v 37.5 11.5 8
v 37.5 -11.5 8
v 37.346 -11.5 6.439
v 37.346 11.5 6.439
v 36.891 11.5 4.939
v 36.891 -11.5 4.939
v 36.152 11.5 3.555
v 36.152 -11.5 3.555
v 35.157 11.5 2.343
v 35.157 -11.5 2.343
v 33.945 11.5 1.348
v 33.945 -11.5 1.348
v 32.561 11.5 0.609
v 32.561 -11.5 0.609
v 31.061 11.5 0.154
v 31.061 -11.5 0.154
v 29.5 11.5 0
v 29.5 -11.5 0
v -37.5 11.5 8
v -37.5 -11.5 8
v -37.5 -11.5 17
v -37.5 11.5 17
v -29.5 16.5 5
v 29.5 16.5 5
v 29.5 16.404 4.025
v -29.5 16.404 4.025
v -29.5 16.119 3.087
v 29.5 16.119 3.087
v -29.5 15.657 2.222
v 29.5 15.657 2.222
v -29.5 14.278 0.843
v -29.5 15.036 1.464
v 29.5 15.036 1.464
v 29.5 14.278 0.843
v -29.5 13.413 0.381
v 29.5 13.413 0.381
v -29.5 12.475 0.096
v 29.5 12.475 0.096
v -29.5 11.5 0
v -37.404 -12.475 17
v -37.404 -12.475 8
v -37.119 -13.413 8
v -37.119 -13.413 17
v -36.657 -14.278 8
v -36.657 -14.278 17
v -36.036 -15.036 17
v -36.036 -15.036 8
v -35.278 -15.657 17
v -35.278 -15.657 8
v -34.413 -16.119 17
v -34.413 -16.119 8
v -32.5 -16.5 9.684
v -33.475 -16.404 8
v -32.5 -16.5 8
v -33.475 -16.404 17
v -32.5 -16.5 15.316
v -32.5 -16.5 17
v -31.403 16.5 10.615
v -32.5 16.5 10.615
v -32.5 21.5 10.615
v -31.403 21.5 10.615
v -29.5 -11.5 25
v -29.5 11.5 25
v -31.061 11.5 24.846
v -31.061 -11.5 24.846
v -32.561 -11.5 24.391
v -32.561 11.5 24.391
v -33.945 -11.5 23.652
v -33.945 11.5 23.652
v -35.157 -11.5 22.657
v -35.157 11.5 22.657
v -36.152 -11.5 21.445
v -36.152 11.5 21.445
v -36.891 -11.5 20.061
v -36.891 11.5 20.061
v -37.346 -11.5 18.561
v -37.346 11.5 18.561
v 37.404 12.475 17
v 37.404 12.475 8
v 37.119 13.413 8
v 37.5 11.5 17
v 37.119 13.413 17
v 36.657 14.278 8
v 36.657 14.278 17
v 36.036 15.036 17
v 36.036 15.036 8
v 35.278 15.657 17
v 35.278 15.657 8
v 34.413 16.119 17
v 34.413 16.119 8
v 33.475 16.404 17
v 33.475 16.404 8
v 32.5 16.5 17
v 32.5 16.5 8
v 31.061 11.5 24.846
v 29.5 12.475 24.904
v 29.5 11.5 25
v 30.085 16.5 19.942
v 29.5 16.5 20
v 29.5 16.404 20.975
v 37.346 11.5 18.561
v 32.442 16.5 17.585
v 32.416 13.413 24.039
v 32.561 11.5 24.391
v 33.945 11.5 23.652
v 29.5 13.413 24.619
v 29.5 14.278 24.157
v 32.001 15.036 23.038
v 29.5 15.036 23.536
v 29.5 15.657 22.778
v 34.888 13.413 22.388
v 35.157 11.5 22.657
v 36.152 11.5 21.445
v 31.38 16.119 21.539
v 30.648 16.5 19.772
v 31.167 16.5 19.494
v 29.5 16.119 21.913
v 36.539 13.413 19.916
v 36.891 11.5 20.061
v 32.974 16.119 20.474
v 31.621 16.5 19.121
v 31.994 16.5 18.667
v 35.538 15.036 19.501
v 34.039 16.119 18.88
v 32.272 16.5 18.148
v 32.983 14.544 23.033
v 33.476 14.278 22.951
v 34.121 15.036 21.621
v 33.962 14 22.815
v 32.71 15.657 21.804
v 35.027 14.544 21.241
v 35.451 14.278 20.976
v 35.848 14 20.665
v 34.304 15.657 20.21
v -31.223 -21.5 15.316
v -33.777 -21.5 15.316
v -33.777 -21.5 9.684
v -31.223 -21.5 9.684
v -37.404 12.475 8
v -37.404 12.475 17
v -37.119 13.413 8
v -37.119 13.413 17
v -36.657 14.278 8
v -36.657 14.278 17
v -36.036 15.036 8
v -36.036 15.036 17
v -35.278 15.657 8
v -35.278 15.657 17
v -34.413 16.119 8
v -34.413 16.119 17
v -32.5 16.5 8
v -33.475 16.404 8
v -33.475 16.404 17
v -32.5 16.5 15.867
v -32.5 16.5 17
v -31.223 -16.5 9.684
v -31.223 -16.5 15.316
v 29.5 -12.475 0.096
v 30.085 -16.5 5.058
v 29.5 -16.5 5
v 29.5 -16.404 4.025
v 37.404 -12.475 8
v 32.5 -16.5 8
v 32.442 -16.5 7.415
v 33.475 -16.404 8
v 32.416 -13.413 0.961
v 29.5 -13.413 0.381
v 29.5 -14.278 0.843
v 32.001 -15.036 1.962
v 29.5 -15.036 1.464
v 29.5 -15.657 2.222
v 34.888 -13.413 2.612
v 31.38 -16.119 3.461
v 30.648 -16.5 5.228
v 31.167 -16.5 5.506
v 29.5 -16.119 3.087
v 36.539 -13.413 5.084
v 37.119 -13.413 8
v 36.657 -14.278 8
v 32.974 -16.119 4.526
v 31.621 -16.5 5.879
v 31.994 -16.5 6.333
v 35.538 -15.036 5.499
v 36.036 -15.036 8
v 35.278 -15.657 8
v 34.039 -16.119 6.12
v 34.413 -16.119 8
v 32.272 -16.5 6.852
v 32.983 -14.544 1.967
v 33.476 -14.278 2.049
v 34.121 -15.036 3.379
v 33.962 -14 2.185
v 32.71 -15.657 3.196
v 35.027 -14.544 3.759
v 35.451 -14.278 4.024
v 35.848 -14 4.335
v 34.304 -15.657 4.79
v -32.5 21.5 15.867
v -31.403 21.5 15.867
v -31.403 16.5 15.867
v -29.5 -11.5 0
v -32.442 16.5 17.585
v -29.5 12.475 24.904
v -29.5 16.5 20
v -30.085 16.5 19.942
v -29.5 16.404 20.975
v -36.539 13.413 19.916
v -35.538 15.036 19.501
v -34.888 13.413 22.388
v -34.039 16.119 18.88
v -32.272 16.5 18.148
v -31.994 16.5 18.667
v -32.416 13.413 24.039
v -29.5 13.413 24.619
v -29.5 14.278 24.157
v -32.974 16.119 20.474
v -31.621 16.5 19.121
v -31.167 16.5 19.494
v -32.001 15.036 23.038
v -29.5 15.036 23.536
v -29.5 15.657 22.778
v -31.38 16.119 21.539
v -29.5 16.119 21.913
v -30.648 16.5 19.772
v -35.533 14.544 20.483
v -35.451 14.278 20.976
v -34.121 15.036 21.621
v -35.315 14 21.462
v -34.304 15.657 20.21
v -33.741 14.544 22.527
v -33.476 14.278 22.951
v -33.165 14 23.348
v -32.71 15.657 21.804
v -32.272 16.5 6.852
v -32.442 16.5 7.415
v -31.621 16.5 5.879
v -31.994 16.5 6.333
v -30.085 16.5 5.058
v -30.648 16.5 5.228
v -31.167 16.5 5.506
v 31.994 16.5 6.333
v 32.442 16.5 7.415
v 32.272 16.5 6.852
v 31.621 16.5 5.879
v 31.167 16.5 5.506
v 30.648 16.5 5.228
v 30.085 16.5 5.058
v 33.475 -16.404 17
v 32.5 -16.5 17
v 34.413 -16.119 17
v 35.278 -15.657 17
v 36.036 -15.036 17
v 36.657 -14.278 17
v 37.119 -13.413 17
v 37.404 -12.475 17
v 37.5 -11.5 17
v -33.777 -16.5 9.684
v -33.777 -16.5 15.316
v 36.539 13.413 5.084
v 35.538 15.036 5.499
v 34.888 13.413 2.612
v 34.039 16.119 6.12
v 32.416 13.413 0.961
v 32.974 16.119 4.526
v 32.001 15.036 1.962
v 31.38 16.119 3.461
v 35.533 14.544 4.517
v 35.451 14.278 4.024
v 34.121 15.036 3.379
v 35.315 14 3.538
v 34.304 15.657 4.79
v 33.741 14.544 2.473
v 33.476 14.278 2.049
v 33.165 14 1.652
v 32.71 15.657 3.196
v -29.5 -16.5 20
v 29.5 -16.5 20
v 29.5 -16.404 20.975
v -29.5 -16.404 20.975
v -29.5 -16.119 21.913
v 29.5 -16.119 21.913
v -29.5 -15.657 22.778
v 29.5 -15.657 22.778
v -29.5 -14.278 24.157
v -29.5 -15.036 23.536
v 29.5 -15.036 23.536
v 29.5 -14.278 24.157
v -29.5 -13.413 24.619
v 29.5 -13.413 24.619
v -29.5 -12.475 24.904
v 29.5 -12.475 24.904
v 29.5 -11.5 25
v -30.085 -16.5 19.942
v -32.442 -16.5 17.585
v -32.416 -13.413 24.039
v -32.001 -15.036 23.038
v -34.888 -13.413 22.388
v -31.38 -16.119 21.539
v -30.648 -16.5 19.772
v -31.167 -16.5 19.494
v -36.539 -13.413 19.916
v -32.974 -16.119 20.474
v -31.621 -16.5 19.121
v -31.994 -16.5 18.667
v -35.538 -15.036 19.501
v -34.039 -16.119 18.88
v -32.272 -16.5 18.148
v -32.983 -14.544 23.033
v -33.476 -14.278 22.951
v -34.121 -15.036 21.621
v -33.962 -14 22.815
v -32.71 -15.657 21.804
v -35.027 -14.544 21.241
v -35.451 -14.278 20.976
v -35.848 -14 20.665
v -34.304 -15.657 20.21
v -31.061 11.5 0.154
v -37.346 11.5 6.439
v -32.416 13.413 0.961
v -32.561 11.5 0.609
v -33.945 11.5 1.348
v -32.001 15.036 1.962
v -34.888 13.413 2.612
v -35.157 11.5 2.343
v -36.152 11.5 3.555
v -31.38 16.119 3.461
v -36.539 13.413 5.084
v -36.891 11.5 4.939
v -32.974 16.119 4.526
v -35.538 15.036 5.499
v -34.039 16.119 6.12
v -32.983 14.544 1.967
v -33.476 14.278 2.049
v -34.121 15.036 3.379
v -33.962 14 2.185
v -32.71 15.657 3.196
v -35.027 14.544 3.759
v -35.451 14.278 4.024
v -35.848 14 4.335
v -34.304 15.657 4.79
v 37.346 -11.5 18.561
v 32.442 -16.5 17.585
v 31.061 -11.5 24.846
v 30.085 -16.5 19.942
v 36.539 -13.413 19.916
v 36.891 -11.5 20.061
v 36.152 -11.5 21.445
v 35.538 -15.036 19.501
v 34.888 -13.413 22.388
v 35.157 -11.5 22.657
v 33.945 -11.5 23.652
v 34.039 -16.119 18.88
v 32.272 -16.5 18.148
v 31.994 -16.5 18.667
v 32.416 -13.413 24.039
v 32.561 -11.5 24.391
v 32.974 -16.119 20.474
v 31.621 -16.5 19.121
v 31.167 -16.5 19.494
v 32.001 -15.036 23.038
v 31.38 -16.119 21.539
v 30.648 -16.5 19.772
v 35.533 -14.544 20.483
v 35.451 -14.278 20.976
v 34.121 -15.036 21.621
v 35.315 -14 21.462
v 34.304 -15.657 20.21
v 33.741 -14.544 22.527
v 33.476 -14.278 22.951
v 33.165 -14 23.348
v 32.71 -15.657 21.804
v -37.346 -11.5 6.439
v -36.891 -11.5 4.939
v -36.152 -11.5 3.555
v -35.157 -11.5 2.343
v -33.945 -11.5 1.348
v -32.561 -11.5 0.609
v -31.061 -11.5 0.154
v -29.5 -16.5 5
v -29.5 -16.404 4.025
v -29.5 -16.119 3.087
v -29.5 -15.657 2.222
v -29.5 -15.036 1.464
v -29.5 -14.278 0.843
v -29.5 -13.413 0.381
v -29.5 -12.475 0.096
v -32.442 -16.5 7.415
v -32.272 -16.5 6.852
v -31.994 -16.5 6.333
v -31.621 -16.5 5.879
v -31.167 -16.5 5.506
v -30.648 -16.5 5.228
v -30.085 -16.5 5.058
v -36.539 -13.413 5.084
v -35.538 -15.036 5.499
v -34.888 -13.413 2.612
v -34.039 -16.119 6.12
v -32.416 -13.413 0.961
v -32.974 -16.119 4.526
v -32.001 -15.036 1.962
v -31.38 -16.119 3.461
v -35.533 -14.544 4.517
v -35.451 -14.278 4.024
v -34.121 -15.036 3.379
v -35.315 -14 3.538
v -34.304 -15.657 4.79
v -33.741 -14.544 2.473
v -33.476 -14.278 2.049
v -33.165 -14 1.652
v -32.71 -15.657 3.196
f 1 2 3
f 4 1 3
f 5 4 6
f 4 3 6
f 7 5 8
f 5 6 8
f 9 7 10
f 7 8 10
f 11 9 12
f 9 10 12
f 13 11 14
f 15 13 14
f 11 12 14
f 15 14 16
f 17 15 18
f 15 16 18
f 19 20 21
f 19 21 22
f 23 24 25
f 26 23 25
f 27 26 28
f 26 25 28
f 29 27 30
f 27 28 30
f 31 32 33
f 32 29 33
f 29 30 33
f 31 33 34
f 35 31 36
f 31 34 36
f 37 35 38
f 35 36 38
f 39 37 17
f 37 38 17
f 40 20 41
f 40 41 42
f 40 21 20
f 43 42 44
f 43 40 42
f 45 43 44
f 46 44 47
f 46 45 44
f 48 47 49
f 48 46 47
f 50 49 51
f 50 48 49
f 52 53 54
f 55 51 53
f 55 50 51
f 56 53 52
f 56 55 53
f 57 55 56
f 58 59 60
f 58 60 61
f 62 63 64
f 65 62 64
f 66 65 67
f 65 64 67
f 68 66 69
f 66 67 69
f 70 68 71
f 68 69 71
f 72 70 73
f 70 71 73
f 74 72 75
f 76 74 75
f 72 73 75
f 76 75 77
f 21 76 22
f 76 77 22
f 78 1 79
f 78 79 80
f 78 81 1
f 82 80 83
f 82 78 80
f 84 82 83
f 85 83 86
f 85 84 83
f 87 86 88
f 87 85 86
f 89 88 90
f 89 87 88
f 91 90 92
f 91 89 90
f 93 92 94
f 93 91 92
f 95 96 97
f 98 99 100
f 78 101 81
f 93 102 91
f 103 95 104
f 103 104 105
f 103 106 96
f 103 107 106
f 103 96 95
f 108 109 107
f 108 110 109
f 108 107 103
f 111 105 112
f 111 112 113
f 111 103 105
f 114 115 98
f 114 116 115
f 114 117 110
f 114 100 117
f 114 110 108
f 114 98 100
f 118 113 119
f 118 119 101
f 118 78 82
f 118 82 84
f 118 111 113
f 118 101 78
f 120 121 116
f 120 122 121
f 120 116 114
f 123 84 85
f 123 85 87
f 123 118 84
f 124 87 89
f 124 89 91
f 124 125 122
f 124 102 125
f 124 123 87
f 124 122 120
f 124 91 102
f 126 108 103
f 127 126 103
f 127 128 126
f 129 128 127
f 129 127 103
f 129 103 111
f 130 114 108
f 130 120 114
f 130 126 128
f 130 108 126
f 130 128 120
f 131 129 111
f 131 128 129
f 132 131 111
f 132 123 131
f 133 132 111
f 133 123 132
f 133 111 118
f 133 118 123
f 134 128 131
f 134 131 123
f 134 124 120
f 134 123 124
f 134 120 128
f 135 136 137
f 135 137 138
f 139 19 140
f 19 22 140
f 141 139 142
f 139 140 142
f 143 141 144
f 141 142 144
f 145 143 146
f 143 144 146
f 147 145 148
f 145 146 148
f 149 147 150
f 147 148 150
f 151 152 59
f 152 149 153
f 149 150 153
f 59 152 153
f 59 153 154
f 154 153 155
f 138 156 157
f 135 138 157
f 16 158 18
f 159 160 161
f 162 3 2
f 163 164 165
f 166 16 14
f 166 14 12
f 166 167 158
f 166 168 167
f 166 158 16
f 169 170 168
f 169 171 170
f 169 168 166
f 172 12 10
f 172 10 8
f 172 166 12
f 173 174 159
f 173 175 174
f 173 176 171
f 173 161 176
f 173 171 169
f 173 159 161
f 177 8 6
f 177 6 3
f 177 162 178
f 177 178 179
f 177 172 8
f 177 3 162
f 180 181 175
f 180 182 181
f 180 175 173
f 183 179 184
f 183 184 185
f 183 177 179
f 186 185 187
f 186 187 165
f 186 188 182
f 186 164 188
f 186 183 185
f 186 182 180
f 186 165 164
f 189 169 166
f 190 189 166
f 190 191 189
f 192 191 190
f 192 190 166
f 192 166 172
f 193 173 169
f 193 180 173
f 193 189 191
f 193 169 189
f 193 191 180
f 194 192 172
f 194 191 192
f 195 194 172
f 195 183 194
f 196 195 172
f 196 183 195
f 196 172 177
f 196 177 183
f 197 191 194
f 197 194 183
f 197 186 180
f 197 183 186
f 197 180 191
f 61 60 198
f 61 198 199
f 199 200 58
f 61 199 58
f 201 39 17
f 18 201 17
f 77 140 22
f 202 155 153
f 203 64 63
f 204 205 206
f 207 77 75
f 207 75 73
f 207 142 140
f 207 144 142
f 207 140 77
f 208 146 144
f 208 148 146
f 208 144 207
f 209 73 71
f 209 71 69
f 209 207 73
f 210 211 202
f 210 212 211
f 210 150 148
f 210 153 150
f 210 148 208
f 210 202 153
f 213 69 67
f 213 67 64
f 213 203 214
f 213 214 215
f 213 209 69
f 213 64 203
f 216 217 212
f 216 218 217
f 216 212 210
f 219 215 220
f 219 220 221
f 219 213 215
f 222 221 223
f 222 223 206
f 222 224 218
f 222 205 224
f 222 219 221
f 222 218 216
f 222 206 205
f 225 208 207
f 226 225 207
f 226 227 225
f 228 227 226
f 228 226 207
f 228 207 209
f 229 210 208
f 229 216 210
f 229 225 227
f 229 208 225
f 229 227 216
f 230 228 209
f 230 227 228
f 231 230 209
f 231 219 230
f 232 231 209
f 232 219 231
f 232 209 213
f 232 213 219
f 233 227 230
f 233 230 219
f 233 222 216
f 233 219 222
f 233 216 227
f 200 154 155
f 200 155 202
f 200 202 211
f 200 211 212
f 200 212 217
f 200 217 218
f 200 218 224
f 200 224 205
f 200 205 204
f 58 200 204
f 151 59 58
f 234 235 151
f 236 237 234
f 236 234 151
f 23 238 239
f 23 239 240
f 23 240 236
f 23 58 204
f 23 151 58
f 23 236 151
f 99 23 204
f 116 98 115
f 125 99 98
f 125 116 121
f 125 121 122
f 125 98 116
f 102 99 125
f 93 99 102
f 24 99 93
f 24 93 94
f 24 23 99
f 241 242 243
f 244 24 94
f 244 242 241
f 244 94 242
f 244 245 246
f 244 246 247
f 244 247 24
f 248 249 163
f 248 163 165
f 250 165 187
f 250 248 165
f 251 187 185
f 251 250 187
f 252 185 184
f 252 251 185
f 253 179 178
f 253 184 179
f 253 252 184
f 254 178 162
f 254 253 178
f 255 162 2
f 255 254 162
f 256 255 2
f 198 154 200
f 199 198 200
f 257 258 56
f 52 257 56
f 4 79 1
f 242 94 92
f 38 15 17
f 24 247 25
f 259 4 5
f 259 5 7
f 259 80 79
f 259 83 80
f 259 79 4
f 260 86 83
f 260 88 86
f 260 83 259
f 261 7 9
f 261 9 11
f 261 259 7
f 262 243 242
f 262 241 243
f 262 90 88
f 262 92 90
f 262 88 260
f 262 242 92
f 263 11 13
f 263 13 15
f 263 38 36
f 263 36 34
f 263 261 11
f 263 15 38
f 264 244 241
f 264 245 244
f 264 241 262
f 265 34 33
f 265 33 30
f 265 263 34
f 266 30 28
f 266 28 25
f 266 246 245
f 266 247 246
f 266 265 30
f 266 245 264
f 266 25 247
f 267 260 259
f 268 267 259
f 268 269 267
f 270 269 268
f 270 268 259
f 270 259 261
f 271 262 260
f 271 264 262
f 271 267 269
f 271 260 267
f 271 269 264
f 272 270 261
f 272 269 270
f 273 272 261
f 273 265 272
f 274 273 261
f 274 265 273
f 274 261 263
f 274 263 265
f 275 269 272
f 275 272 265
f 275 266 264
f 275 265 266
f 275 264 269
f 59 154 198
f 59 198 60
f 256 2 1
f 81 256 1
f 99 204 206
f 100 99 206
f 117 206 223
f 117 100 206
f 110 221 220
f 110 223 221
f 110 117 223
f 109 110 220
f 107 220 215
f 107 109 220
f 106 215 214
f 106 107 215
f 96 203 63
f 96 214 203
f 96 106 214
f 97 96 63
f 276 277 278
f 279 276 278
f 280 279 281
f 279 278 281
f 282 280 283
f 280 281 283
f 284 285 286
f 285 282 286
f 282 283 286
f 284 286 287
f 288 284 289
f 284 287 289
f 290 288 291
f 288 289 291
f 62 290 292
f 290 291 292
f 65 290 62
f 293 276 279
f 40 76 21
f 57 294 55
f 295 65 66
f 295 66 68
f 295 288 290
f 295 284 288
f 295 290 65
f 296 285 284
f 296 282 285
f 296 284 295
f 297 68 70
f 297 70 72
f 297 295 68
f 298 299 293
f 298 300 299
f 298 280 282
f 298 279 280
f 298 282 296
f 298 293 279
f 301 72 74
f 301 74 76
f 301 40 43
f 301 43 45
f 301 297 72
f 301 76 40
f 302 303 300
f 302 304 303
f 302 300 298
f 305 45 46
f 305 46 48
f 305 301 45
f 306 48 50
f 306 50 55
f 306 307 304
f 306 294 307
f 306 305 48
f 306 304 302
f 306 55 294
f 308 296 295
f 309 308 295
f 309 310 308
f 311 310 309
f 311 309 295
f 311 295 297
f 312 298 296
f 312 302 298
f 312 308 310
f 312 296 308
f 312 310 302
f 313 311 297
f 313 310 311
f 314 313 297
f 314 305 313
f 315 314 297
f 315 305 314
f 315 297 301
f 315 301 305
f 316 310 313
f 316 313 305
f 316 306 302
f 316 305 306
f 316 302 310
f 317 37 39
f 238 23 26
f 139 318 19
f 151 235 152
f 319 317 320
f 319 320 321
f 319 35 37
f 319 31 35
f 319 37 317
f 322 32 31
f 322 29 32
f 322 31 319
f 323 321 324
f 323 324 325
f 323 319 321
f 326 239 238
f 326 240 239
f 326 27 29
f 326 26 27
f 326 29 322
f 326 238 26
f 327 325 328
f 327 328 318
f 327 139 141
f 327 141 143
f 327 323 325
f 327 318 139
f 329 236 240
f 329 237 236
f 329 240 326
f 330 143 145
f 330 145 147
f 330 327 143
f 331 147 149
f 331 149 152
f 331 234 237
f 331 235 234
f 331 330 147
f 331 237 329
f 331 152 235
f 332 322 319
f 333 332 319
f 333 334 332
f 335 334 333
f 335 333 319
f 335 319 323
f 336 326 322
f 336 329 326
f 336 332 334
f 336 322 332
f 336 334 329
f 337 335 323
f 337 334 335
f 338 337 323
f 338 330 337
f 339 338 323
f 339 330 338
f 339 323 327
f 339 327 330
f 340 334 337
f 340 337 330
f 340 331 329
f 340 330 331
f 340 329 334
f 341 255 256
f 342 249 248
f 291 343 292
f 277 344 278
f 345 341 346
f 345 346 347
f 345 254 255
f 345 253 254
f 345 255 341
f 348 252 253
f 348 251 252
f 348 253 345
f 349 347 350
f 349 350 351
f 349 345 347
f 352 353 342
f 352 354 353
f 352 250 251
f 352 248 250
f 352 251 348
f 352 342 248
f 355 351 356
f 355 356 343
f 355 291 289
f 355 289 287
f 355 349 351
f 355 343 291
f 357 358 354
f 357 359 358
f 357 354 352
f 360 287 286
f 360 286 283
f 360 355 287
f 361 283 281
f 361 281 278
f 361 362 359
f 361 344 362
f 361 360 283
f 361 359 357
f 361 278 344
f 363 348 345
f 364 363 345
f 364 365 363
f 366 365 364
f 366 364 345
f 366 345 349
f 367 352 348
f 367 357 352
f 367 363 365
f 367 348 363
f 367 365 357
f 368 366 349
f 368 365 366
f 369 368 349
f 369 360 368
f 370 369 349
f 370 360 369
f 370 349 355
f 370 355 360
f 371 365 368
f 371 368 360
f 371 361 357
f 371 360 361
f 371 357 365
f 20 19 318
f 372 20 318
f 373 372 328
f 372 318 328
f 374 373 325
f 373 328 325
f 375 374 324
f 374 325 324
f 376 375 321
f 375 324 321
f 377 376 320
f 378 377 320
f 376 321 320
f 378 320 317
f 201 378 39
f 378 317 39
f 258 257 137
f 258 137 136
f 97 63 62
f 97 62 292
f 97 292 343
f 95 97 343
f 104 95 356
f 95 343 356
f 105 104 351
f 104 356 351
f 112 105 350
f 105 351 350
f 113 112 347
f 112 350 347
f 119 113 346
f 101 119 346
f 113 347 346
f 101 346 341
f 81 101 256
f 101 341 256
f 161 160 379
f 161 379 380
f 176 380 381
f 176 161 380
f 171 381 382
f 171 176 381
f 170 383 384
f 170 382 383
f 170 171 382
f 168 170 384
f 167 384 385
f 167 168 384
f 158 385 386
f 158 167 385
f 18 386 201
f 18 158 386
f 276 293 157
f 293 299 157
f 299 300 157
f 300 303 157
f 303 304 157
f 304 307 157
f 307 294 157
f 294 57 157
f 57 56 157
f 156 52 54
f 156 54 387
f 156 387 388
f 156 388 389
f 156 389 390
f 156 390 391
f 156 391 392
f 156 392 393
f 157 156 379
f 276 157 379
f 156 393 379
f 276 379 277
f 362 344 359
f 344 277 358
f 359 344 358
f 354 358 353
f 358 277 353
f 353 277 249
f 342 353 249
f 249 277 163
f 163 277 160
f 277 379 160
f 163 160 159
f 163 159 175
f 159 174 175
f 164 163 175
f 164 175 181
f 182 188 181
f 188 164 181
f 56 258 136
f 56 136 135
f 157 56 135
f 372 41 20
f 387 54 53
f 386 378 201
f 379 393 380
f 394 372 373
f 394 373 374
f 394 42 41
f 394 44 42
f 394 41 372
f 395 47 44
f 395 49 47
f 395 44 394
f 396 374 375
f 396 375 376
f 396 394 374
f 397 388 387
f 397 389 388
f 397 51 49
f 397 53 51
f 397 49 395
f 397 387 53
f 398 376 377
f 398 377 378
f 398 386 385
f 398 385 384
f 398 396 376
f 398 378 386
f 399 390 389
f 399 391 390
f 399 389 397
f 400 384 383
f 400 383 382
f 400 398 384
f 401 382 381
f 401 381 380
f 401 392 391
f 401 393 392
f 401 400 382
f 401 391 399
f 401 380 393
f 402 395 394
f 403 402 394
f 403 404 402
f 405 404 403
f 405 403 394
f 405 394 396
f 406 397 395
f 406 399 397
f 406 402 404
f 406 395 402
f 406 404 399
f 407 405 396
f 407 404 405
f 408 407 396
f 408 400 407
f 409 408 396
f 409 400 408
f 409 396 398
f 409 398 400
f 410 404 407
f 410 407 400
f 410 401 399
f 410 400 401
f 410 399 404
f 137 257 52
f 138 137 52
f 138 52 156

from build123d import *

# Parameters (mm, degrees)
SKETCH1_W           = 75
SKETCH1_H           = 33
BOSS_EXTRUDE1_DEPTH = 25
FILLET1_R           = 5
FILLET2_R           = 8
SKETCH2_W           = 2.553418492
SKETCH2_H           = 5.632377872
BOSS_EXTRUDE2_DEPTH = 5
SKETCH3_W           = 1.096638537
SKETCH3_H           = 5.251652717
BOSS_EXTRUDE3_DEPTH = 5


with BuildPart() as part:
    # Sketch1 → Boss-Extrude1 (new body)
    with BuildSketch(Plane.XY):
        Rectangle(SKETCH1_W, SKETCH1_H)
    extrude(amount=BOSS_EXTRUDE1_DEPTH)

    # Fillet1
    fillet1_edges = [part.edges().sort_by_distance(p)[0] for p in [
        (0, -16.5, 25),
        (0, -16.5, 0),
        (0, 16.5, 0),
        (0, 16.5, 25),
        (37.5, -16.5, 12.5),
        (-37.5, -16.5, 12.5),
        (-37.5, 16.5, 12.5),
        (37.5, 16.5, 12.5),
    ]]
    fillet(fillet1_edges, radius=FILLET1_R)

    # Fillet2
    # the kernel refuses this fillet: 8 mm, written as the material it takes off along each edge
    with BuildSketch(Plane(origin=(-29.5, 16.5, 17), x_dir=(-1, 0, 0), z_dir=(0, 0, -1))) as fillet2_piece_1:
        with BuildLine():
            CenterArc((3, -5), 5, 0, 90)
            Line((8, -5), (8, 0))
            Line((8, 0), (3, 0))
        make_face()
    revolve(axis=Axis((-29.5, 16.5, 17), (0, 1, 0)), revolution_arc=90, mode=Mode.SUBTRACT)
    with BuildSketch(Plane(origin=(-29.5, 16.5, 8), x_dir=(0, 0, -1), z_dir=(1, 0, 0))) as fillet2_piece_2:
        with BuildLine():
            CenterArc((3, -5), 5, 0, 90)
            Line((8, -5), (8, 0))
            Line((8, 0), (3, 0))
        make_face()
    revolve(axis=Axis((-29.5, 16.5, 8), (0, 1, 0)), revolution_arc=90, mode=Mode.SUBTRACT)
    with BuildSketch(Plane(origin=(29.5, 16.5, 17), x_dir=(0, 0, 1), z_dir=(-1, 0, 0))) as fillet2_piece_3:
        with BuildLine():
            CenterArc((3, -5), 5, 0, 90)
            Line((8, -5), (8, 0))
            Line((8, 0), (3, 0))
        make_face()
    revolve(axis=Axis((29.5, 16.5, 17), (0, 1, 0)), revolution_arc=90, mode=Mode.SUBTRACT)
    with BuildSketch(Plane(origin=(29.5, 16.5, 8), x_dir=(1, 0, 0), z_dir=(0, 0, 1))) as fillet2_piece_4:
        with BuildLine():
            CenterArc((3, -5), 5, 0, 90)
            Line((8, -5), (8, 0))
            Line((8, 0), (3, 0))
        make_face()
    revolve(axis=Axis((29.5, 16.5, 8), (0, 1, 0)), revolution_arc=90, mode=Mode.SUBTRACT)
    with BuildSketch(Plane(origin=(-29.5, -16.5, 17), x_dir=(0, 0, 1), z_dir=(1, 0, 0))) as fillet2_piece_5:
        with BuildLine():
            CenterArc((3, -5), 5, 0, 90)
            Line((8, -5), (8, 0))
            Line((8, 0), (3, 0))
        make_face()
    revolve(axis=Axis((-29.5, -16.5, 17), (0, -1, 0)), revolution_arc=90, mode=Mode.SUBTRACT)
    with BuildSketch(Plane(origin=(-29.5, -16.5, 8), x_dir=(-1, 0, 0), z_dir=(0, 0, 1))) as fillet2_piece_6:
        with BuildLine():
            CenterArc((3, -5), 5, 0, 90)
            Line((8, -5), (8, 0))
            Line((8, 0), (3, 0))
        make_face()
    revolve(axis=Axis((-29.5, -16.5, 8), (0, -1, 0)), revolution_arc=90, mode=Mode.SUBTRACT)
    with BuildSketch(Plane(origin=(29.5, -16.5, 17), x_dir=(1, 0, 0), z_dir=(0, 0, -1))) as fillet2_piece_7:
        with BuildLine():
            CenterArc((3, -5), 5, 0, 90)
            Line((8, -5), (8, 0))
            Line((8, 0), (3, 0))
        make_face()
    revolve(axis=Axis((29.5, -16.5, 17), (0, -1, 0)), revolution_arc=90, mode=Mode.SUBTRACT)
    with BuildSketch(Plane(origin=(29.5, -16.5, 8), x_dir=(0, 0, -1), z_dir=(-1, 0, 0))) as fillet2_piece_8:
        with BuildLine():
            CenterArc((3, -5), 5, 0, 90)
            Line((8, -5), (8, 0))
            Line((8, 0), (3, 0))
        make_face()
    revolve(axis=Axis((29.5, -16.5, 8), (0, -1, 0)), revolution_arc=90, mode=Mode.SUBTRACT)
    with BuildSketch(Plane(origin=(37.5, -16.5, 0), x_dir=(0, 0, 1), z_dir=(0, 1, 0)), Plane(origin=(37.5, -16.5, 25), x_dir=(-1, 0, 0), z_dir=(0, 1, 0)), Plane(origin=(-37.5, 16.5, 0), x_dir=(0, 0, 1), z_dir=(0, -1, 0)), Plane(origin=(-37.5, 16.5, 25), x_dir=(1, 0, 0), z_dir=(0, -1, 0))) as fillet2_piece_9:
        with BuildLine():
            CenterArc((FILLET2_R, -FILLET2_R), FILLET2_R, 90, 90)
            Line((0, -FILLET2_R), (0, 0))
            Line((0, 0), (FILLET2_R, 0))
        make_face()
    extrude(amount=33, mode=Mode.SUBTRACT)

    # Sketch2 → Boss-Extrude2 (add)
    with BuildSketch(Plane.XZ.offset(16.5)):
        with Locations((-32.5, 12.5)):
            Rectangle(SKETCH2_W, SKETCH2_H)
    extrude(amount=BOSS_EXTRUDE2_DEPTH)

    # Sketch3 → Boss-Extrude3 (add)
    with BuildSketch(Plane(origin=(0, 16.5, 0), x_dir=(1, 0, 0), z_dir=(0, 1, 0))):
        with Locations((-31.951680732, -13.240900807)):
            Rectangle(SKETCH3_W, SKETCH3_H)
    extrude(amount=BOSS_EXTRUDE3_DEPTH)


solid = part.part
